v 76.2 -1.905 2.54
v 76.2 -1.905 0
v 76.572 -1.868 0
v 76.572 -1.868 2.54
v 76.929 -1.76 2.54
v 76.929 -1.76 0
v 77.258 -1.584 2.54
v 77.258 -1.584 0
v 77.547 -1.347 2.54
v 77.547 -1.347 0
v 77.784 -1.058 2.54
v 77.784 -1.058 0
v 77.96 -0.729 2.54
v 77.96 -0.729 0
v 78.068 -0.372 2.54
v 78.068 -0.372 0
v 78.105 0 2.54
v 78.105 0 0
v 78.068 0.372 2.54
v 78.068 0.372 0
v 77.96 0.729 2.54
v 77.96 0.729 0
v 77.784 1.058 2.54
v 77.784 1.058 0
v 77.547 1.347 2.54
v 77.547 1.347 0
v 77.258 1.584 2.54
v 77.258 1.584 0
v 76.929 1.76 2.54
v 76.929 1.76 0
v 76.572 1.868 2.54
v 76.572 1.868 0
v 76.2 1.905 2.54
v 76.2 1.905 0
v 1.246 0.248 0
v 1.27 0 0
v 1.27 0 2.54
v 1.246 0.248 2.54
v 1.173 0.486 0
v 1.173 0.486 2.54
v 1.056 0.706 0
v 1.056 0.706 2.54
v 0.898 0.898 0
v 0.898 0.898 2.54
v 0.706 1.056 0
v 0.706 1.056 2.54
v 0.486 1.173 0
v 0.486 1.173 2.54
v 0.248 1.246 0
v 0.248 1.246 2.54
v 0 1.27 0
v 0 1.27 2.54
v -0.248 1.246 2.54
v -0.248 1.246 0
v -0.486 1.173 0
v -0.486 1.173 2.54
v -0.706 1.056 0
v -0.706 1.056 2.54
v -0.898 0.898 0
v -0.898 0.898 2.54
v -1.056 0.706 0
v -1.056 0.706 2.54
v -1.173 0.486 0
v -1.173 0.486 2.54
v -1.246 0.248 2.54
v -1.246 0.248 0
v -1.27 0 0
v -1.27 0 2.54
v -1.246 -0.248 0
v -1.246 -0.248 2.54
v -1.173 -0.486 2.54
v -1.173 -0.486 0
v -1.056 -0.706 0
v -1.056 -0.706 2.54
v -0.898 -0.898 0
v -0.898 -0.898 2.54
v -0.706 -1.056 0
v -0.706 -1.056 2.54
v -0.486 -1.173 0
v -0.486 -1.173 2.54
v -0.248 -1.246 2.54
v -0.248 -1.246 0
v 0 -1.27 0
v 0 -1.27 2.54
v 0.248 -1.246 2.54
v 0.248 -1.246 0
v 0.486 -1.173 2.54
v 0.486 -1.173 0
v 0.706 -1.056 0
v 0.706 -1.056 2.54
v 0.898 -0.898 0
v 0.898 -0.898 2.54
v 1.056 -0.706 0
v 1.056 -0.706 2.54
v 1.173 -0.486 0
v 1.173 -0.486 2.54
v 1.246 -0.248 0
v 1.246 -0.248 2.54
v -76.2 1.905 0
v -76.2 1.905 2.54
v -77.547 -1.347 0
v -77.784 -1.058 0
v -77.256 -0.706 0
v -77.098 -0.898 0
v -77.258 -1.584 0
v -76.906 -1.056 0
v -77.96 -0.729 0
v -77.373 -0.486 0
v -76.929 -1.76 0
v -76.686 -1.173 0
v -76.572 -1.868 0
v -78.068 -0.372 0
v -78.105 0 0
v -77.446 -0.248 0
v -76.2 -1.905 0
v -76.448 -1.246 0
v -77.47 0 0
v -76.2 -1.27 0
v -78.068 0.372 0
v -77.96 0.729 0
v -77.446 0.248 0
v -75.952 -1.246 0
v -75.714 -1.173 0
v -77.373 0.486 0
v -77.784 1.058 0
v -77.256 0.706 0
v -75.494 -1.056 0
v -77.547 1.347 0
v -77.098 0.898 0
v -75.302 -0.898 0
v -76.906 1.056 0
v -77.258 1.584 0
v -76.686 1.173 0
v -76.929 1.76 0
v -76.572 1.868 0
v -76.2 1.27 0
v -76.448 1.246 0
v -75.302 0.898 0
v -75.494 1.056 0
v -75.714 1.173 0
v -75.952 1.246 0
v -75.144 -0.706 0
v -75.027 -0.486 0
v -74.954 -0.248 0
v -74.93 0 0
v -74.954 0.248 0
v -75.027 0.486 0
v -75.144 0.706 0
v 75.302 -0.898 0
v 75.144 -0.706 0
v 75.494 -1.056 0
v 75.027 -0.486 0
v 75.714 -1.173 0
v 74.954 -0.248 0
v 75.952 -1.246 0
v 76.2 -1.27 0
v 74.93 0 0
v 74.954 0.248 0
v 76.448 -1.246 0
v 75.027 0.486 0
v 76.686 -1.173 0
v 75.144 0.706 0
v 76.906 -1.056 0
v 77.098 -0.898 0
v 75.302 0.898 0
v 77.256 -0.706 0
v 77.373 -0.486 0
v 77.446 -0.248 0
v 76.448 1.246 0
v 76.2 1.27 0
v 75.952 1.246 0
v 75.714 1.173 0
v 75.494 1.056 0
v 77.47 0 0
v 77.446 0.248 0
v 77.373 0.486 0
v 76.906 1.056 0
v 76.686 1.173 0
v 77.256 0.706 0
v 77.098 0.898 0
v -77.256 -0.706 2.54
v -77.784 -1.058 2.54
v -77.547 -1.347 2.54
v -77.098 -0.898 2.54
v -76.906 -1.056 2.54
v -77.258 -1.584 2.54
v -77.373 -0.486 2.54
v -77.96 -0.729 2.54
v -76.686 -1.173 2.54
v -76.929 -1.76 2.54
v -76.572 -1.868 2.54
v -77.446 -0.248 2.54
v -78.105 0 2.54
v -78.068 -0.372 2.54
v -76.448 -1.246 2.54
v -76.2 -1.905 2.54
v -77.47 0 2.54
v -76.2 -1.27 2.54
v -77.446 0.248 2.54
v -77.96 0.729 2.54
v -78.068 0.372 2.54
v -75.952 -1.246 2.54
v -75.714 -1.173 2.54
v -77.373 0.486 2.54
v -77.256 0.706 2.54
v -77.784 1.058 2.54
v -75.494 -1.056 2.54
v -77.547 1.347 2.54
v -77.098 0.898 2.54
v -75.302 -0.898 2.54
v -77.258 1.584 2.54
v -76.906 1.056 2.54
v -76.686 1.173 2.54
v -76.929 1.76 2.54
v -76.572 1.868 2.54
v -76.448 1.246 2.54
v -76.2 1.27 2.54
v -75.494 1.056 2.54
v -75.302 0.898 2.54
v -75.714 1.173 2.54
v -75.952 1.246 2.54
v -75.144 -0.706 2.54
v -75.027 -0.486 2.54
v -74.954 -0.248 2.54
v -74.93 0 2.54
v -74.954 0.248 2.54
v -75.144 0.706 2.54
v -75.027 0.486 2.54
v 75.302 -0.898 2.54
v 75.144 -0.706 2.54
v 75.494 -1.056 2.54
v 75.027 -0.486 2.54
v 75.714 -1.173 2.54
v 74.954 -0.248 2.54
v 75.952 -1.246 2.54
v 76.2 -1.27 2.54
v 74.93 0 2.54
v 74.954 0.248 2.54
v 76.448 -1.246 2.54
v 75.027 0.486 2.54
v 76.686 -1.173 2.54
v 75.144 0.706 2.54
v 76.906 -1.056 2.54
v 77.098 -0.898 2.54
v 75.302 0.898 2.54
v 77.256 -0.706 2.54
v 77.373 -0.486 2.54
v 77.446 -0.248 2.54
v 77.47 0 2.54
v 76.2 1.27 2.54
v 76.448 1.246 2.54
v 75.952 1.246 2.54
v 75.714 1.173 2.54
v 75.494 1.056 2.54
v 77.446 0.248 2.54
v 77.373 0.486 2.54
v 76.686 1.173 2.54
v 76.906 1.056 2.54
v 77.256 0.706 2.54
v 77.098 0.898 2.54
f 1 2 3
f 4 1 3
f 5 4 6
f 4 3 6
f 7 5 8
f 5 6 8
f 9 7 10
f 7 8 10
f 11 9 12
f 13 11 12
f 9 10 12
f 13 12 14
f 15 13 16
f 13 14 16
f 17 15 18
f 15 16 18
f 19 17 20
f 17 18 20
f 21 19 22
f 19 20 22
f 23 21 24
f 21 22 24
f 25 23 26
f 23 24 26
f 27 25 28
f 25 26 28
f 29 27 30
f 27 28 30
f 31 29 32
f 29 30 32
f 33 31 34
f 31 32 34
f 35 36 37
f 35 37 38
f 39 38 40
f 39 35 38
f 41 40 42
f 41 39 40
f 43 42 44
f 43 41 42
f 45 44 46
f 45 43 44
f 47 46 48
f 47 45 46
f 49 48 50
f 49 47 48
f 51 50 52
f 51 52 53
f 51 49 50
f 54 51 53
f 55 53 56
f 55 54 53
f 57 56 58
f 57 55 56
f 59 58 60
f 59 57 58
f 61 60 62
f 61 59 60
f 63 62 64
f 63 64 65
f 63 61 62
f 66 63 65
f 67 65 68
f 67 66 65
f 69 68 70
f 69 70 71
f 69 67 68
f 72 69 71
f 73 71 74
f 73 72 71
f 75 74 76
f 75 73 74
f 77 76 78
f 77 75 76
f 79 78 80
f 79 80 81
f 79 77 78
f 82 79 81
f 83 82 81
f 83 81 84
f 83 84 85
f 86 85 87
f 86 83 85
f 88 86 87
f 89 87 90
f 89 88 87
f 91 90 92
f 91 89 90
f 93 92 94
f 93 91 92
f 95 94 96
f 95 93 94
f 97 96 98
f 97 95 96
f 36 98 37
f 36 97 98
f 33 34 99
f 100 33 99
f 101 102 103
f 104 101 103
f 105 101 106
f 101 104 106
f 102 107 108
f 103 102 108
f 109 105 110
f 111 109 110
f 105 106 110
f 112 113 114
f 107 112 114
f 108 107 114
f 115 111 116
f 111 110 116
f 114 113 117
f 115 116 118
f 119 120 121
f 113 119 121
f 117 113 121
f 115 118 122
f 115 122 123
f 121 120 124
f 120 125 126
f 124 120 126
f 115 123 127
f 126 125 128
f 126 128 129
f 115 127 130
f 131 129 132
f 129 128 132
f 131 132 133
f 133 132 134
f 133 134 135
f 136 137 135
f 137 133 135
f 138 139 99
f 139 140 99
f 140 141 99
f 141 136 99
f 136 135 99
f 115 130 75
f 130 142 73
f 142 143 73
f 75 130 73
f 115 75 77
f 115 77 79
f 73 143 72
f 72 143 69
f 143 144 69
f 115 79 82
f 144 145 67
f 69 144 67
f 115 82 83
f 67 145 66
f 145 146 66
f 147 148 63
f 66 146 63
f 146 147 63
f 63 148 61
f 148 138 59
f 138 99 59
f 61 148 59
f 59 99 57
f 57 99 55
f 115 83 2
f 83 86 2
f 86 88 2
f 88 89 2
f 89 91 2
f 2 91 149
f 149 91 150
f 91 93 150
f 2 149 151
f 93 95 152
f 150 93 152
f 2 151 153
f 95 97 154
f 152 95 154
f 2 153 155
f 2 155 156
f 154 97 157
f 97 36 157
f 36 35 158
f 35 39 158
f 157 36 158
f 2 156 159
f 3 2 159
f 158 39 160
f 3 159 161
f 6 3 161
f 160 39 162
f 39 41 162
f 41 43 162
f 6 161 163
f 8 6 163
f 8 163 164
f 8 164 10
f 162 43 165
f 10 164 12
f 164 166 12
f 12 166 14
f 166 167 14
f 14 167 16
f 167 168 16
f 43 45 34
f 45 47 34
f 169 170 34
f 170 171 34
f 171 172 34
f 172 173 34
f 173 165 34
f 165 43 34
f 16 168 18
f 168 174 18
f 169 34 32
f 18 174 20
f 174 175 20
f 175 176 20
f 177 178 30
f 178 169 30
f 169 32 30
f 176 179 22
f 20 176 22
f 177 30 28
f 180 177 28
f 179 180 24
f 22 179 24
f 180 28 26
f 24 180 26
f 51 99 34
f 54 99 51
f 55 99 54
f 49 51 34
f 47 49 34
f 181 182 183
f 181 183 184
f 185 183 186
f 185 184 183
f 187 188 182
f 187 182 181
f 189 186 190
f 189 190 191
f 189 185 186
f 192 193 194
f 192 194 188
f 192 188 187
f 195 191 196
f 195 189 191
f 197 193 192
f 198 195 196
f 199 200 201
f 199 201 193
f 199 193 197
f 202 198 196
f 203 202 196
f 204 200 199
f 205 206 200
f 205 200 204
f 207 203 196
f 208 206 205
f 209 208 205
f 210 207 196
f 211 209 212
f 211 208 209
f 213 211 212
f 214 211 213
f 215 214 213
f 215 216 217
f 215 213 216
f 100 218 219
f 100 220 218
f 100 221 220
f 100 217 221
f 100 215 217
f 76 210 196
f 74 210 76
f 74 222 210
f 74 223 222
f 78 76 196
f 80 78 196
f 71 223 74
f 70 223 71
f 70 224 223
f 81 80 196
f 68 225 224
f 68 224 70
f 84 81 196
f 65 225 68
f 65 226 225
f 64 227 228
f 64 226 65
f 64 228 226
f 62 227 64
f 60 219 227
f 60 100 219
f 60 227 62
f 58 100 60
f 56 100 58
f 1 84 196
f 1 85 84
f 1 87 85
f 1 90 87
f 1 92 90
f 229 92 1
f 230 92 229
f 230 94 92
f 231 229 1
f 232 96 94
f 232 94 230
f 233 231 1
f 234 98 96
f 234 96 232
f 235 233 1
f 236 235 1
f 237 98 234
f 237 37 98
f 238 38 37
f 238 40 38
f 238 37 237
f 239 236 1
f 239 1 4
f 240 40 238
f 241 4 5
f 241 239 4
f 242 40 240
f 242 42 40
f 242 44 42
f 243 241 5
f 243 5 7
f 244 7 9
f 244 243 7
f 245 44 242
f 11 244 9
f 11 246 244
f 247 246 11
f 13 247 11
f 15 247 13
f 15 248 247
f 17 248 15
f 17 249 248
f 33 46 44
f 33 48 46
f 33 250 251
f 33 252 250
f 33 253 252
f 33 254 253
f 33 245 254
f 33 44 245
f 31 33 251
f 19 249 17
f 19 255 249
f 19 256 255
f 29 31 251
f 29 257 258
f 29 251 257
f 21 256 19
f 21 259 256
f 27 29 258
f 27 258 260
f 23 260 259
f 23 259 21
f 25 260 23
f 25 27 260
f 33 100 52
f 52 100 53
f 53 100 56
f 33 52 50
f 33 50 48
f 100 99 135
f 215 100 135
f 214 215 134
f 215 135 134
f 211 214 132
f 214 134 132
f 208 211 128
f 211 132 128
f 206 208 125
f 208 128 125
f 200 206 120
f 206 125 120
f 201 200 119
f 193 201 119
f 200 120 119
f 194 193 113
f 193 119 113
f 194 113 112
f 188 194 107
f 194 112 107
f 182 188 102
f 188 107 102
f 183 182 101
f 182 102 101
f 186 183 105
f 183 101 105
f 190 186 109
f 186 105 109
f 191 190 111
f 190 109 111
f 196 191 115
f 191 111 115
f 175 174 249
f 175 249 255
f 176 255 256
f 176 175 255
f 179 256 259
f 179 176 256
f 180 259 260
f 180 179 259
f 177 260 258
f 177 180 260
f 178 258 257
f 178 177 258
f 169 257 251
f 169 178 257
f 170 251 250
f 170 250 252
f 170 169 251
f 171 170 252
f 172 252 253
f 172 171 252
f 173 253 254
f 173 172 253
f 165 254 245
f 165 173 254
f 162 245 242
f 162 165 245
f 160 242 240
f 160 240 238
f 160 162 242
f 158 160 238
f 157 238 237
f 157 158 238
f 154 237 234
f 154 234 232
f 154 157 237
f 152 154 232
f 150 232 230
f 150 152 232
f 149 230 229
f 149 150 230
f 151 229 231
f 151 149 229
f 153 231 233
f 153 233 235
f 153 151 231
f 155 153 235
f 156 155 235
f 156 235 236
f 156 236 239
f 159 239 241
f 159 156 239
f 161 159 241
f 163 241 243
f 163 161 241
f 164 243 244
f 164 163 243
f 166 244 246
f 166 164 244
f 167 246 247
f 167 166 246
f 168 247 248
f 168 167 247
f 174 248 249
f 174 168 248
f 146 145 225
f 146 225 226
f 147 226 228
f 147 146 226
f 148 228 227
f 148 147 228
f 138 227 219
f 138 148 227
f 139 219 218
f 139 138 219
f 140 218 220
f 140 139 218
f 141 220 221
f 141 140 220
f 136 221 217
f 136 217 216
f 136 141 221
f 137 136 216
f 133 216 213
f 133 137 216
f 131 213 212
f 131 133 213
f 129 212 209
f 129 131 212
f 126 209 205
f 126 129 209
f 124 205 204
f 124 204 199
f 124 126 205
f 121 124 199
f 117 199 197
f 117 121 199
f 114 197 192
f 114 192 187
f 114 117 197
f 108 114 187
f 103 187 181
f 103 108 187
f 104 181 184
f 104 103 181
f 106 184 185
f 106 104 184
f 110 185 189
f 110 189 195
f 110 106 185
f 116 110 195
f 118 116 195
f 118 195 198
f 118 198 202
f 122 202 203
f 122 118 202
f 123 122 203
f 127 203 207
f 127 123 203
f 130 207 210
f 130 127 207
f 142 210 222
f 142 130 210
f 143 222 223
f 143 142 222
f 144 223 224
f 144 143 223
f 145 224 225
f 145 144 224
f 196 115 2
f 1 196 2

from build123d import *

# Parameters (mm, degrees)
SKETCH2_R           = 1.905
SKETCH2_R_2         = 1.27
BOSS_EXTRUDE1_DEPTH = 2.54


with BuildPart() as part:
    # Sketch2 → Boss-Extrude1 (new body)
    # profile 1 of 5: a face of its own
    with BuildSketch(Plane.XY):
        with BuildLine():
            Line((0, 1.905), (-76.2, 1.905))
            ThreePointArc((-76.2, 1.905), (-74.852961582, 1.347038418), (-74.295, 0))
            ThreePointArc((-74.295, 0), (-74.852961582, -1.347038418), (-76.2, -1.905))
            Line((-76.2, -1.905), (-1.9e-08, -1.905))
            ThreePointArc((-1.9e-08, -1.905), (-1.905, 9e-09), (0, 1.905))
        make_face()
    # profile 2 of 5: a face of its own
    with BuildSketch(Plane.XY):
        with Locations((-76.2, 0)):
            Circle(SKETCH2_R)
        with Locations((-76.2, 0)):
            Circle(SKETCH2_R_2, mode=Mode.SUBTRACT)
    # profile 3 of 5: a face of its own
    with BuildSketch(Plane.XY):
        with BuildLine():
            Line((76.2, 1.905), (0, 1.905))
            ThreePointArc((0, 1.905), (1.347038418, 1.347038418), (1.905, 0))
            ThreePointArc((1.905, 0), (1.347038412, -1.347038425), (-1.9e-08, -1.905))
            Line((-1.9e-08, -1.905), (76.2, -1.905))
            ThreePointArc((76.2, -1.905), (74.295, 0), (76.2, 1.905))
        make_face()
    # profile 4 of 5: a face of its own
    with BuildSketch(Plane.XY):
        with Locations((76.2, 0)):
            Circle(SKETCH2_R)
        with Locations((76.2, 0)):
            Circle(SKETCH2_R_2, mode=Mode.SUBTRACT)
    # profile 5 of 5: a face of its own
    with BuildSketch(Plane.XY):
        Circle(SKETCH2_R)
        Circle(SKETCH2_R_2, mode=Mode.SUBTRACT)
    extrude(amount=BOSS_EXTRUDE1_DEPTH)


solid = part.part
